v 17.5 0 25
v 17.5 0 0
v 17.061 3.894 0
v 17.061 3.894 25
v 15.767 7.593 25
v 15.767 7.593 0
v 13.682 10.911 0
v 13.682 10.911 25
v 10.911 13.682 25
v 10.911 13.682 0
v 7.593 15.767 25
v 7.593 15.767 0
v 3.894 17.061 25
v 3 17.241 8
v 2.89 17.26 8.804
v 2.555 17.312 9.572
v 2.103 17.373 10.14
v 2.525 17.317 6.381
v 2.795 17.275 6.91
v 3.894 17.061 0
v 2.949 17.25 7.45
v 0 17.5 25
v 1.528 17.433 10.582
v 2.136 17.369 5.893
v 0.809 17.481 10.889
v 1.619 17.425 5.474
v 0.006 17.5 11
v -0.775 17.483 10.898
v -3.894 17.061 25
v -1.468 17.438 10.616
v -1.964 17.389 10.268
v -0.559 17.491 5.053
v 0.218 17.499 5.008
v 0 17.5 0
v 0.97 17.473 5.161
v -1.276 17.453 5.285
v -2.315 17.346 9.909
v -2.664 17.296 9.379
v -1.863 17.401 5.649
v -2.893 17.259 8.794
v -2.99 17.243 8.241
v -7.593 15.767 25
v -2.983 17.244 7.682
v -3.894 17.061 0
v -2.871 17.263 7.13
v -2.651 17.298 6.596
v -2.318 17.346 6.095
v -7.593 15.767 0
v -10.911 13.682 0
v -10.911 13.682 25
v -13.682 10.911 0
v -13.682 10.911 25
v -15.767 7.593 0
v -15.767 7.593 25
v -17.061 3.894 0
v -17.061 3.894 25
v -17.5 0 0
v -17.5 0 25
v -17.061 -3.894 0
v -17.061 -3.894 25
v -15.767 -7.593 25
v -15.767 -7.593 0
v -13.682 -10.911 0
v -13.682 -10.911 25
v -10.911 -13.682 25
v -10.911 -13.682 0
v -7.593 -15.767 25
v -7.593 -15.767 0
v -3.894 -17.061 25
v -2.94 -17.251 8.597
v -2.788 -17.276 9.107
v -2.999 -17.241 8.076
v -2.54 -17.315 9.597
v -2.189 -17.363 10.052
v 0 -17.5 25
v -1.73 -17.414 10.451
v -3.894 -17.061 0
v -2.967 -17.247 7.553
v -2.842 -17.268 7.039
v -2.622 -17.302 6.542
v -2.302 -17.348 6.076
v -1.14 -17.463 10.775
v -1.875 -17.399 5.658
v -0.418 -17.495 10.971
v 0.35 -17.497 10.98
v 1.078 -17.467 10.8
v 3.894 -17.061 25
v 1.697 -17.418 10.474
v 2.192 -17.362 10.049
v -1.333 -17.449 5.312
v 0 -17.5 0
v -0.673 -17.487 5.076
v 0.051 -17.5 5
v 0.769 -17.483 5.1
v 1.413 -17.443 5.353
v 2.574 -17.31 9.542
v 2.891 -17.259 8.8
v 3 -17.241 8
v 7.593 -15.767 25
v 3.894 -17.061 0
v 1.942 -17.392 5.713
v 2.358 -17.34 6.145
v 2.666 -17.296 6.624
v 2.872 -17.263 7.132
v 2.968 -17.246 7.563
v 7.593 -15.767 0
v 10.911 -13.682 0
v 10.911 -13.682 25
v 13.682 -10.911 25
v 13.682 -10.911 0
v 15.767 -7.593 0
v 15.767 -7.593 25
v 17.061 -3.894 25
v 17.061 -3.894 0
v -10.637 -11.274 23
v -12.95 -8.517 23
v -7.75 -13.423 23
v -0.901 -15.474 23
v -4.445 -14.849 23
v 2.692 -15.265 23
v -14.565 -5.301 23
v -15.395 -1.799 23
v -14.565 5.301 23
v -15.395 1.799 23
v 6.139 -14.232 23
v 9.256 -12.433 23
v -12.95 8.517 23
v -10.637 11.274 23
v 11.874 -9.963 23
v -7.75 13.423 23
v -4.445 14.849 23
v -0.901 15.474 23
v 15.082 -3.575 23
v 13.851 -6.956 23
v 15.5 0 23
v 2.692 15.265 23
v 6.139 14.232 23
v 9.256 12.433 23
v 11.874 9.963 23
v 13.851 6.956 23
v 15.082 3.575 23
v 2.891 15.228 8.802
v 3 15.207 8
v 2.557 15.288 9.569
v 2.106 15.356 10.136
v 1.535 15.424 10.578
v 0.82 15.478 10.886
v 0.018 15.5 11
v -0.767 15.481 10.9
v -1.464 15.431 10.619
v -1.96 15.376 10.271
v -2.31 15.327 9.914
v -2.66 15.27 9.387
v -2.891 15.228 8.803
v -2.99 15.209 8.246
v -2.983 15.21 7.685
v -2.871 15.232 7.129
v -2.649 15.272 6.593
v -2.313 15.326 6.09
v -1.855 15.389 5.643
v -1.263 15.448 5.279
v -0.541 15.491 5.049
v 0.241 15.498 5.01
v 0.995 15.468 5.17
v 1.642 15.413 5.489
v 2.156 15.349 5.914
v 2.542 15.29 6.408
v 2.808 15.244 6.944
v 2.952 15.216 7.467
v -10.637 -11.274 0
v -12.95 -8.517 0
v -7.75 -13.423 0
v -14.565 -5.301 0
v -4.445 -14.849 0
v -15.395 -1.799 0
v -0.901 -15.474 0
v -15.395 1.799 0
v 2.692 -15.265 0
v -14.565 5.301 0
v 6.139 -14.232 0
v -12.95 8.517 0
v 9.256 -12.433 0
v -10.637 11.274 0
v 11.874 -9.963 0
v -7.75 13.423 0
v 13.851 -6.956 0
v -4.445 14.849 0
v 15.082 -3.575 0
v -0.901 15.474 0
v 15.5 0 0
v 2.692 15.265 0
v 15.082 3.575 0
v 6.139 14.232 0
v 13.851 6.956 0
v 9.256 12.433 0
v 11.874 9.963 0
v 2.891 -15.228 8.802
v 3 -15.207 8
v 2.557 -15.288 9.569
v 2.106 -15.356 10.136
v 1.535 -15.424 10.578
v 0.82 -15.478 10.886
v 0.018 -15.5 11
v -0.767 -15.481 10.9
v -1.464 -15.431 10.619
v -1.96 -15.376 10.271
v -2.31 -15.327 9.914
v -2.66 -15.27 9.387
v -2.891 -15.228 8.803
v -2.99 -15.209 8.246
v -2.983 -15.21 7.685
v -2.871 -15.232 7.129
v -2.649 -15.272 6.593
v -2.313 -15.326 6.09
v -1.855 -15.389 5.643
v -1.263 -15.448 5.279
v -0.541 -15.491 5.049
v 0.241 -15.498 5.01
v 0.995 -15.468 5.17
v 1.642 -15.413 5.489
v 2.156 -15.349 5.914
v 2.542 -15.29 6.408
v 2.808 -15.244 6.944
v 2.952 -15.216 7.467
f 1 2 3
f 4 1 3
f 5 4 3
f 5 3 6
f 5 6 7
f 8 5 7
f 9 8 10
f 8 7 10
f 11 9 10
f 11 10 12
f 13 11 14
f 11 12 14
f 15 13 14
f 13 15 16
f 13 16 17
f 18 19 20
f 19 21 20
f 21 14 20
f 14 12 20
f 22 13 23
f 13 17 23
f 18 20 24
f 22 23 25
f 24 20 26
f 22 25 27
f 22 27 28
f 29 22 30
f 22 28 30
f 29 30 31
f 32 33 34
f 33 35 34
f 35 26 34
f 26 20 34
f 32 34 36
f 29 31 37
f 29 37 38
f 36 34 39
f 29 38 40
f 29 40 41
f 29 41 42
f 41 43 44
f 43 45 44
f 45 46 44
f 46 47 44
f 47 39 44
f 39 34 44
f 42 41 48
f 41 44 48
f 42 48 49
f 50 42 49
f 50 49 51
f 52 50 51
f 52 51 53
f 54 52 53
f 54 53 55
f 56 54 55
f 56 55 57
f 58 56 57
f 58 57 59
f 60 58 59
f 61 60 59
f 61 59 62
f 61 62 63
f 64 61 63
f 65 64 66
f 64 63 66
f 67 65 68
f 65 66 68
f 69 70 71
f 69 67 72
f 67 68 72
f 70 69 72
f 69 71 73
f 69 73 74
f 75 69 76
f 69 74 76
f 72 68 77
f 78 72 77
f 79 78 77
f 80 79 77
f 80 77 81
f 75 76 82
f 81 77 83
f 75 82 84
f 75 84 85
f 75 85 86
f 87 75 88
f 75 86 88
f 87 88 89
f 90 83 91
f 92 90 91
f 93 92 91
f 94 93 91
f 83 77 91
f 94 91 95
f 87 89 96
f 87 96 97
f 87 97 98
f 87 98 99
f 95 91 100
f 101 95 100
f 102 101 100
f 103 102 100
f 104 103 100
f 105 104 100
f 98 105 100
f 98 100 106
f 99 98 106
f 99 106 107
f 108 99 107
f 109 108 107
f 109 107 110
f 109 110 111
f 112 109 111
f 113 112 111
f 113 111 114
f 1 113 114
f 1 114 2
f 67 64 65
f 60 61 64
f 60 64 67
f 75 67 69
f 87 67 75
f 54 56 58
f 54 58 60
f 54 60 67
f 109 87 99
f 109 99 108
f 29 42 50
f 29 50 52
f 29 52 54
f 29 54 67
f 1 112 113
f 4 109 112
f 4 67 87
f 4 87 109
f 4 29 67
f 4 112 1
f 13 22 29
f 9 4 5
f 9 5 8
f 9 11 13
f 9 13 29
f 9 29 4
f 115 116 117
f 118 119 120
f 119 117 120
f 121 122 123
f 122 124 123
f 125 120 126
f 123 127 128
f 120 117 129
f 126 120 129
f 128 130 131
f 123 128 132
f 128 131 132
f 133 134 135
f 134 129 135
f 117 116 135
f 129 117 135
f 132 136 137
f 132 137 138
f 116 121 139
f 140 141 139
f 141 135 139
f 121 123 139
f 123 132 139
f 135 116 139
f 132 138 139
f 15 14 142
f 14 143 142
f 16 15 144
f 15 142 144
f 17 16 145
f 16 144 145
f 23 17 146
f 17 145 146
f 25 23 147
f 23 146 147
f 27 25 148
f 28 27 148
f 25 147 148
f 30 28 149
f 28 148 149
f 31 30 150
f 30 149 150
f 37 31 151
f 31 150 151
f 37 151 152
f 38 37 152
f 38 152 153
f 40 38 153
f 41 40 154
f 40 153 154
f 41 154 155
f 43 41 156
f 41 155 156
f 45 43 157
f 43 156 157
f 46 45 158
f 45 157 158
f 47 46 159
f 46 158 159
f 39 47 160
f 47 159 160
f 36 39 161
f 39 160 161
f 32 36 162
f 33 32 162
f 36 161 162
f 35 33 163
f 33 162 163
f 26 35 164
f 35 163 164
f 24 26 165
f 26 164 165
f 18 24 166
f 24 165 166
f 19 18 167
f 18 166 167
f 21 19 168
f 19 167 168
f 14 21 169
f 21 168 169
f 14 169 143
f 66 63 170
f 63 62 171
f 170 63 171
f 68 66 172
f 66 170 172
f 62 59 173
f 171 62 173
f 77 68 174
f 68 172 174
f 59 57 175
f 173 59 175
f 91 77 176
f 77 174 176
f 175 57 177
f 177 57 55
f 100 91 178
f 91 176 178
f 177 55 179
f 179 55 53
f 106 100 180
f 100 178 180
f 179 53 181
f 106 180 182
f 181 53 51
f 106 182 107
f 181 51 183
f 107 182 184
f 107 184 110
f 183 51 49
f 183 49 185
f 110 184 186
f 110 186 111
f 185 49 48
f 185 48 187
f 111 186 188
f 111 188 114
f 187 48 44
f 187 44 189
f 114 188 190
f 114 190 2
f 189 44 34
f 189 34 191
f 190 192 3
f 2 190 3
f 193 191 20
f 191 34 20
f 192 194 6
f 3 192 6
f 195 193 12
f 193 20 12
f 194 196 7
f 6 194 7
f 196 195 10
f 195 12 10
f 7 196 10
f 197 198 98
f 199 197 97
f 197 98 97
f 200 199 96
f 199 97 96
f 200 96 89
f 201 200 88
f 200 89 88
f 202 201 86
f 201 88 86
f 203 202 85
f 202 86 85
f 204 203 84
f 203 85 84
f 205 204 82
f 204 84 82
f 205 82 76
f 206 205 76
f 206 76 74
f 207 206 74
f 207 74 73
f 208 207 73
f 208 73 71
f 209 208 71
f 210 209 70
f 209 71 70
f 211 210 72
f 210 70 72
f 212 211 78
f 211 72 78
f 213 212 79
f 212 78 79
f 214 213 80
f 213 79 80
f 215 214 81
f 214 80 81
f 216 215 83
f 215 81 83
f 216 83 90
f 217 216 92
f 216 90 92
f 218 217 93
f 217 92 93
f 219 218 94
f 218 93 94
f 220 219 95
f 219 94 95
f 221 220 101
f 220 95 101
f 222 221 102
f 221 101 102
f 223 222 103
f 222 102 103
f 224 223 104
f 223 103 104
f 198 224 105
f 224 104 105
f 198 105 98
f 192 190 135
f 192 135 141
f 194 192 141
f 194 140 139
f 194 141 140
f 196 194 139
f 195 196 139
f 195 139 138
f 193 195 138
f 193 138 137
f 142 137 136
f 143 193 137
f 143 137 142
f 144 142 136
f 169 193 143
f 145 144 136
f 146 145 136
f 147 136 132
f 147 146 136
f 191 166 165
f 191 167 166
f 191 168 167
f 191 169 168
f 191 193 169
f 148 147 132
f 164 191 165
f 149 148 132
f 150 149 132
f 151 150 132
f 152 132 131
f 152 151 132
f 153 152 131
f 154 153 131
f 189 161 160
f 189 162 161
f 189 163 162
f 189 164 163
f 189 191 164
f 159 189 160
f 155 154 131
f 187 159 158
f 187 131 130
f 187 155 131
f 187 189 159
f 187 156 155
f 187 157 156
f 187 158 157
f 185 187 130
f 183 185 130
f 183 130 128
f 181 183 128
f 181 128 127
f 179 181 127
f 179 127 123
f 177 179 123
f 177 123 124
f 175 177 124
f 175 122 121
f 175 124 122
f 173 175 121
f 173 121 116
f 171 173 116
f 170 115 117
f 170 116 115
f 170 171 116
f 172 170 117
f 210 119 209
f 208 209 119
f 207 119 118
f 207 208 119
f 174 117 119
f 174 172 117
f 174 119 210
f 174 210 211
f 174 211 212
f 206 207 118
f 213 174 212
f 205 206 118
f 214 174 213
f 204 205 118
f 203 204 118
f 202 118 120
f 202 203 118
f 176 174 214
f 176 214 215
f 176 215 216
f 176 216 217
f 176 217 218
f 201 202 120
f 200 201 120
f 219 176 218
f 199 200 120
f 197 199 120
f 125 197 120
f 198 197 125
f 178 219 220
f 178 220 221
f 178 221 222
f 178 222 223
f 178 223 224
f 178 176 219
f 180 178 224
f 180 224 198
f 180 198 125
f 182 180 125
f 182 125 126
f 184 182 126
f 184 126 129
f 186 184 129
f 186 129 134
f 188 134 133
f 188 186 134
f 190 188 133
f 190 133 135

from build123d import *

# Parameters (mm, degrees)
F0_R     = 17.5
F1_DEPTH = 25
F2_T     = -2
F3_R     = 3
F4_DEPTH = 19.6


with BuildPart() as f1:
    # F0 (on Top) → F1 (new body)
    with BuildSketch(Plane.XY):
        Circle(F0_R)
    extrude(amount=F1_DEPTH)

    # F2
    f2_openings = [f1.faces().sort_by_distance(p)[0] for p in [
        (0, 0, 0),
    ]]
    offset(amount=F2_T, openings=f2_openings)

    # F3 (on Front) → F4 (cut, symmetric)
    with BuildSketch(Plane.XZ):
        with Locations((0, 8)):
            Circle(F3_R)
    extrude(amount=F4_DEPTH, both=True, mode=Mode.SUBTRACT)


solid = f1.part
